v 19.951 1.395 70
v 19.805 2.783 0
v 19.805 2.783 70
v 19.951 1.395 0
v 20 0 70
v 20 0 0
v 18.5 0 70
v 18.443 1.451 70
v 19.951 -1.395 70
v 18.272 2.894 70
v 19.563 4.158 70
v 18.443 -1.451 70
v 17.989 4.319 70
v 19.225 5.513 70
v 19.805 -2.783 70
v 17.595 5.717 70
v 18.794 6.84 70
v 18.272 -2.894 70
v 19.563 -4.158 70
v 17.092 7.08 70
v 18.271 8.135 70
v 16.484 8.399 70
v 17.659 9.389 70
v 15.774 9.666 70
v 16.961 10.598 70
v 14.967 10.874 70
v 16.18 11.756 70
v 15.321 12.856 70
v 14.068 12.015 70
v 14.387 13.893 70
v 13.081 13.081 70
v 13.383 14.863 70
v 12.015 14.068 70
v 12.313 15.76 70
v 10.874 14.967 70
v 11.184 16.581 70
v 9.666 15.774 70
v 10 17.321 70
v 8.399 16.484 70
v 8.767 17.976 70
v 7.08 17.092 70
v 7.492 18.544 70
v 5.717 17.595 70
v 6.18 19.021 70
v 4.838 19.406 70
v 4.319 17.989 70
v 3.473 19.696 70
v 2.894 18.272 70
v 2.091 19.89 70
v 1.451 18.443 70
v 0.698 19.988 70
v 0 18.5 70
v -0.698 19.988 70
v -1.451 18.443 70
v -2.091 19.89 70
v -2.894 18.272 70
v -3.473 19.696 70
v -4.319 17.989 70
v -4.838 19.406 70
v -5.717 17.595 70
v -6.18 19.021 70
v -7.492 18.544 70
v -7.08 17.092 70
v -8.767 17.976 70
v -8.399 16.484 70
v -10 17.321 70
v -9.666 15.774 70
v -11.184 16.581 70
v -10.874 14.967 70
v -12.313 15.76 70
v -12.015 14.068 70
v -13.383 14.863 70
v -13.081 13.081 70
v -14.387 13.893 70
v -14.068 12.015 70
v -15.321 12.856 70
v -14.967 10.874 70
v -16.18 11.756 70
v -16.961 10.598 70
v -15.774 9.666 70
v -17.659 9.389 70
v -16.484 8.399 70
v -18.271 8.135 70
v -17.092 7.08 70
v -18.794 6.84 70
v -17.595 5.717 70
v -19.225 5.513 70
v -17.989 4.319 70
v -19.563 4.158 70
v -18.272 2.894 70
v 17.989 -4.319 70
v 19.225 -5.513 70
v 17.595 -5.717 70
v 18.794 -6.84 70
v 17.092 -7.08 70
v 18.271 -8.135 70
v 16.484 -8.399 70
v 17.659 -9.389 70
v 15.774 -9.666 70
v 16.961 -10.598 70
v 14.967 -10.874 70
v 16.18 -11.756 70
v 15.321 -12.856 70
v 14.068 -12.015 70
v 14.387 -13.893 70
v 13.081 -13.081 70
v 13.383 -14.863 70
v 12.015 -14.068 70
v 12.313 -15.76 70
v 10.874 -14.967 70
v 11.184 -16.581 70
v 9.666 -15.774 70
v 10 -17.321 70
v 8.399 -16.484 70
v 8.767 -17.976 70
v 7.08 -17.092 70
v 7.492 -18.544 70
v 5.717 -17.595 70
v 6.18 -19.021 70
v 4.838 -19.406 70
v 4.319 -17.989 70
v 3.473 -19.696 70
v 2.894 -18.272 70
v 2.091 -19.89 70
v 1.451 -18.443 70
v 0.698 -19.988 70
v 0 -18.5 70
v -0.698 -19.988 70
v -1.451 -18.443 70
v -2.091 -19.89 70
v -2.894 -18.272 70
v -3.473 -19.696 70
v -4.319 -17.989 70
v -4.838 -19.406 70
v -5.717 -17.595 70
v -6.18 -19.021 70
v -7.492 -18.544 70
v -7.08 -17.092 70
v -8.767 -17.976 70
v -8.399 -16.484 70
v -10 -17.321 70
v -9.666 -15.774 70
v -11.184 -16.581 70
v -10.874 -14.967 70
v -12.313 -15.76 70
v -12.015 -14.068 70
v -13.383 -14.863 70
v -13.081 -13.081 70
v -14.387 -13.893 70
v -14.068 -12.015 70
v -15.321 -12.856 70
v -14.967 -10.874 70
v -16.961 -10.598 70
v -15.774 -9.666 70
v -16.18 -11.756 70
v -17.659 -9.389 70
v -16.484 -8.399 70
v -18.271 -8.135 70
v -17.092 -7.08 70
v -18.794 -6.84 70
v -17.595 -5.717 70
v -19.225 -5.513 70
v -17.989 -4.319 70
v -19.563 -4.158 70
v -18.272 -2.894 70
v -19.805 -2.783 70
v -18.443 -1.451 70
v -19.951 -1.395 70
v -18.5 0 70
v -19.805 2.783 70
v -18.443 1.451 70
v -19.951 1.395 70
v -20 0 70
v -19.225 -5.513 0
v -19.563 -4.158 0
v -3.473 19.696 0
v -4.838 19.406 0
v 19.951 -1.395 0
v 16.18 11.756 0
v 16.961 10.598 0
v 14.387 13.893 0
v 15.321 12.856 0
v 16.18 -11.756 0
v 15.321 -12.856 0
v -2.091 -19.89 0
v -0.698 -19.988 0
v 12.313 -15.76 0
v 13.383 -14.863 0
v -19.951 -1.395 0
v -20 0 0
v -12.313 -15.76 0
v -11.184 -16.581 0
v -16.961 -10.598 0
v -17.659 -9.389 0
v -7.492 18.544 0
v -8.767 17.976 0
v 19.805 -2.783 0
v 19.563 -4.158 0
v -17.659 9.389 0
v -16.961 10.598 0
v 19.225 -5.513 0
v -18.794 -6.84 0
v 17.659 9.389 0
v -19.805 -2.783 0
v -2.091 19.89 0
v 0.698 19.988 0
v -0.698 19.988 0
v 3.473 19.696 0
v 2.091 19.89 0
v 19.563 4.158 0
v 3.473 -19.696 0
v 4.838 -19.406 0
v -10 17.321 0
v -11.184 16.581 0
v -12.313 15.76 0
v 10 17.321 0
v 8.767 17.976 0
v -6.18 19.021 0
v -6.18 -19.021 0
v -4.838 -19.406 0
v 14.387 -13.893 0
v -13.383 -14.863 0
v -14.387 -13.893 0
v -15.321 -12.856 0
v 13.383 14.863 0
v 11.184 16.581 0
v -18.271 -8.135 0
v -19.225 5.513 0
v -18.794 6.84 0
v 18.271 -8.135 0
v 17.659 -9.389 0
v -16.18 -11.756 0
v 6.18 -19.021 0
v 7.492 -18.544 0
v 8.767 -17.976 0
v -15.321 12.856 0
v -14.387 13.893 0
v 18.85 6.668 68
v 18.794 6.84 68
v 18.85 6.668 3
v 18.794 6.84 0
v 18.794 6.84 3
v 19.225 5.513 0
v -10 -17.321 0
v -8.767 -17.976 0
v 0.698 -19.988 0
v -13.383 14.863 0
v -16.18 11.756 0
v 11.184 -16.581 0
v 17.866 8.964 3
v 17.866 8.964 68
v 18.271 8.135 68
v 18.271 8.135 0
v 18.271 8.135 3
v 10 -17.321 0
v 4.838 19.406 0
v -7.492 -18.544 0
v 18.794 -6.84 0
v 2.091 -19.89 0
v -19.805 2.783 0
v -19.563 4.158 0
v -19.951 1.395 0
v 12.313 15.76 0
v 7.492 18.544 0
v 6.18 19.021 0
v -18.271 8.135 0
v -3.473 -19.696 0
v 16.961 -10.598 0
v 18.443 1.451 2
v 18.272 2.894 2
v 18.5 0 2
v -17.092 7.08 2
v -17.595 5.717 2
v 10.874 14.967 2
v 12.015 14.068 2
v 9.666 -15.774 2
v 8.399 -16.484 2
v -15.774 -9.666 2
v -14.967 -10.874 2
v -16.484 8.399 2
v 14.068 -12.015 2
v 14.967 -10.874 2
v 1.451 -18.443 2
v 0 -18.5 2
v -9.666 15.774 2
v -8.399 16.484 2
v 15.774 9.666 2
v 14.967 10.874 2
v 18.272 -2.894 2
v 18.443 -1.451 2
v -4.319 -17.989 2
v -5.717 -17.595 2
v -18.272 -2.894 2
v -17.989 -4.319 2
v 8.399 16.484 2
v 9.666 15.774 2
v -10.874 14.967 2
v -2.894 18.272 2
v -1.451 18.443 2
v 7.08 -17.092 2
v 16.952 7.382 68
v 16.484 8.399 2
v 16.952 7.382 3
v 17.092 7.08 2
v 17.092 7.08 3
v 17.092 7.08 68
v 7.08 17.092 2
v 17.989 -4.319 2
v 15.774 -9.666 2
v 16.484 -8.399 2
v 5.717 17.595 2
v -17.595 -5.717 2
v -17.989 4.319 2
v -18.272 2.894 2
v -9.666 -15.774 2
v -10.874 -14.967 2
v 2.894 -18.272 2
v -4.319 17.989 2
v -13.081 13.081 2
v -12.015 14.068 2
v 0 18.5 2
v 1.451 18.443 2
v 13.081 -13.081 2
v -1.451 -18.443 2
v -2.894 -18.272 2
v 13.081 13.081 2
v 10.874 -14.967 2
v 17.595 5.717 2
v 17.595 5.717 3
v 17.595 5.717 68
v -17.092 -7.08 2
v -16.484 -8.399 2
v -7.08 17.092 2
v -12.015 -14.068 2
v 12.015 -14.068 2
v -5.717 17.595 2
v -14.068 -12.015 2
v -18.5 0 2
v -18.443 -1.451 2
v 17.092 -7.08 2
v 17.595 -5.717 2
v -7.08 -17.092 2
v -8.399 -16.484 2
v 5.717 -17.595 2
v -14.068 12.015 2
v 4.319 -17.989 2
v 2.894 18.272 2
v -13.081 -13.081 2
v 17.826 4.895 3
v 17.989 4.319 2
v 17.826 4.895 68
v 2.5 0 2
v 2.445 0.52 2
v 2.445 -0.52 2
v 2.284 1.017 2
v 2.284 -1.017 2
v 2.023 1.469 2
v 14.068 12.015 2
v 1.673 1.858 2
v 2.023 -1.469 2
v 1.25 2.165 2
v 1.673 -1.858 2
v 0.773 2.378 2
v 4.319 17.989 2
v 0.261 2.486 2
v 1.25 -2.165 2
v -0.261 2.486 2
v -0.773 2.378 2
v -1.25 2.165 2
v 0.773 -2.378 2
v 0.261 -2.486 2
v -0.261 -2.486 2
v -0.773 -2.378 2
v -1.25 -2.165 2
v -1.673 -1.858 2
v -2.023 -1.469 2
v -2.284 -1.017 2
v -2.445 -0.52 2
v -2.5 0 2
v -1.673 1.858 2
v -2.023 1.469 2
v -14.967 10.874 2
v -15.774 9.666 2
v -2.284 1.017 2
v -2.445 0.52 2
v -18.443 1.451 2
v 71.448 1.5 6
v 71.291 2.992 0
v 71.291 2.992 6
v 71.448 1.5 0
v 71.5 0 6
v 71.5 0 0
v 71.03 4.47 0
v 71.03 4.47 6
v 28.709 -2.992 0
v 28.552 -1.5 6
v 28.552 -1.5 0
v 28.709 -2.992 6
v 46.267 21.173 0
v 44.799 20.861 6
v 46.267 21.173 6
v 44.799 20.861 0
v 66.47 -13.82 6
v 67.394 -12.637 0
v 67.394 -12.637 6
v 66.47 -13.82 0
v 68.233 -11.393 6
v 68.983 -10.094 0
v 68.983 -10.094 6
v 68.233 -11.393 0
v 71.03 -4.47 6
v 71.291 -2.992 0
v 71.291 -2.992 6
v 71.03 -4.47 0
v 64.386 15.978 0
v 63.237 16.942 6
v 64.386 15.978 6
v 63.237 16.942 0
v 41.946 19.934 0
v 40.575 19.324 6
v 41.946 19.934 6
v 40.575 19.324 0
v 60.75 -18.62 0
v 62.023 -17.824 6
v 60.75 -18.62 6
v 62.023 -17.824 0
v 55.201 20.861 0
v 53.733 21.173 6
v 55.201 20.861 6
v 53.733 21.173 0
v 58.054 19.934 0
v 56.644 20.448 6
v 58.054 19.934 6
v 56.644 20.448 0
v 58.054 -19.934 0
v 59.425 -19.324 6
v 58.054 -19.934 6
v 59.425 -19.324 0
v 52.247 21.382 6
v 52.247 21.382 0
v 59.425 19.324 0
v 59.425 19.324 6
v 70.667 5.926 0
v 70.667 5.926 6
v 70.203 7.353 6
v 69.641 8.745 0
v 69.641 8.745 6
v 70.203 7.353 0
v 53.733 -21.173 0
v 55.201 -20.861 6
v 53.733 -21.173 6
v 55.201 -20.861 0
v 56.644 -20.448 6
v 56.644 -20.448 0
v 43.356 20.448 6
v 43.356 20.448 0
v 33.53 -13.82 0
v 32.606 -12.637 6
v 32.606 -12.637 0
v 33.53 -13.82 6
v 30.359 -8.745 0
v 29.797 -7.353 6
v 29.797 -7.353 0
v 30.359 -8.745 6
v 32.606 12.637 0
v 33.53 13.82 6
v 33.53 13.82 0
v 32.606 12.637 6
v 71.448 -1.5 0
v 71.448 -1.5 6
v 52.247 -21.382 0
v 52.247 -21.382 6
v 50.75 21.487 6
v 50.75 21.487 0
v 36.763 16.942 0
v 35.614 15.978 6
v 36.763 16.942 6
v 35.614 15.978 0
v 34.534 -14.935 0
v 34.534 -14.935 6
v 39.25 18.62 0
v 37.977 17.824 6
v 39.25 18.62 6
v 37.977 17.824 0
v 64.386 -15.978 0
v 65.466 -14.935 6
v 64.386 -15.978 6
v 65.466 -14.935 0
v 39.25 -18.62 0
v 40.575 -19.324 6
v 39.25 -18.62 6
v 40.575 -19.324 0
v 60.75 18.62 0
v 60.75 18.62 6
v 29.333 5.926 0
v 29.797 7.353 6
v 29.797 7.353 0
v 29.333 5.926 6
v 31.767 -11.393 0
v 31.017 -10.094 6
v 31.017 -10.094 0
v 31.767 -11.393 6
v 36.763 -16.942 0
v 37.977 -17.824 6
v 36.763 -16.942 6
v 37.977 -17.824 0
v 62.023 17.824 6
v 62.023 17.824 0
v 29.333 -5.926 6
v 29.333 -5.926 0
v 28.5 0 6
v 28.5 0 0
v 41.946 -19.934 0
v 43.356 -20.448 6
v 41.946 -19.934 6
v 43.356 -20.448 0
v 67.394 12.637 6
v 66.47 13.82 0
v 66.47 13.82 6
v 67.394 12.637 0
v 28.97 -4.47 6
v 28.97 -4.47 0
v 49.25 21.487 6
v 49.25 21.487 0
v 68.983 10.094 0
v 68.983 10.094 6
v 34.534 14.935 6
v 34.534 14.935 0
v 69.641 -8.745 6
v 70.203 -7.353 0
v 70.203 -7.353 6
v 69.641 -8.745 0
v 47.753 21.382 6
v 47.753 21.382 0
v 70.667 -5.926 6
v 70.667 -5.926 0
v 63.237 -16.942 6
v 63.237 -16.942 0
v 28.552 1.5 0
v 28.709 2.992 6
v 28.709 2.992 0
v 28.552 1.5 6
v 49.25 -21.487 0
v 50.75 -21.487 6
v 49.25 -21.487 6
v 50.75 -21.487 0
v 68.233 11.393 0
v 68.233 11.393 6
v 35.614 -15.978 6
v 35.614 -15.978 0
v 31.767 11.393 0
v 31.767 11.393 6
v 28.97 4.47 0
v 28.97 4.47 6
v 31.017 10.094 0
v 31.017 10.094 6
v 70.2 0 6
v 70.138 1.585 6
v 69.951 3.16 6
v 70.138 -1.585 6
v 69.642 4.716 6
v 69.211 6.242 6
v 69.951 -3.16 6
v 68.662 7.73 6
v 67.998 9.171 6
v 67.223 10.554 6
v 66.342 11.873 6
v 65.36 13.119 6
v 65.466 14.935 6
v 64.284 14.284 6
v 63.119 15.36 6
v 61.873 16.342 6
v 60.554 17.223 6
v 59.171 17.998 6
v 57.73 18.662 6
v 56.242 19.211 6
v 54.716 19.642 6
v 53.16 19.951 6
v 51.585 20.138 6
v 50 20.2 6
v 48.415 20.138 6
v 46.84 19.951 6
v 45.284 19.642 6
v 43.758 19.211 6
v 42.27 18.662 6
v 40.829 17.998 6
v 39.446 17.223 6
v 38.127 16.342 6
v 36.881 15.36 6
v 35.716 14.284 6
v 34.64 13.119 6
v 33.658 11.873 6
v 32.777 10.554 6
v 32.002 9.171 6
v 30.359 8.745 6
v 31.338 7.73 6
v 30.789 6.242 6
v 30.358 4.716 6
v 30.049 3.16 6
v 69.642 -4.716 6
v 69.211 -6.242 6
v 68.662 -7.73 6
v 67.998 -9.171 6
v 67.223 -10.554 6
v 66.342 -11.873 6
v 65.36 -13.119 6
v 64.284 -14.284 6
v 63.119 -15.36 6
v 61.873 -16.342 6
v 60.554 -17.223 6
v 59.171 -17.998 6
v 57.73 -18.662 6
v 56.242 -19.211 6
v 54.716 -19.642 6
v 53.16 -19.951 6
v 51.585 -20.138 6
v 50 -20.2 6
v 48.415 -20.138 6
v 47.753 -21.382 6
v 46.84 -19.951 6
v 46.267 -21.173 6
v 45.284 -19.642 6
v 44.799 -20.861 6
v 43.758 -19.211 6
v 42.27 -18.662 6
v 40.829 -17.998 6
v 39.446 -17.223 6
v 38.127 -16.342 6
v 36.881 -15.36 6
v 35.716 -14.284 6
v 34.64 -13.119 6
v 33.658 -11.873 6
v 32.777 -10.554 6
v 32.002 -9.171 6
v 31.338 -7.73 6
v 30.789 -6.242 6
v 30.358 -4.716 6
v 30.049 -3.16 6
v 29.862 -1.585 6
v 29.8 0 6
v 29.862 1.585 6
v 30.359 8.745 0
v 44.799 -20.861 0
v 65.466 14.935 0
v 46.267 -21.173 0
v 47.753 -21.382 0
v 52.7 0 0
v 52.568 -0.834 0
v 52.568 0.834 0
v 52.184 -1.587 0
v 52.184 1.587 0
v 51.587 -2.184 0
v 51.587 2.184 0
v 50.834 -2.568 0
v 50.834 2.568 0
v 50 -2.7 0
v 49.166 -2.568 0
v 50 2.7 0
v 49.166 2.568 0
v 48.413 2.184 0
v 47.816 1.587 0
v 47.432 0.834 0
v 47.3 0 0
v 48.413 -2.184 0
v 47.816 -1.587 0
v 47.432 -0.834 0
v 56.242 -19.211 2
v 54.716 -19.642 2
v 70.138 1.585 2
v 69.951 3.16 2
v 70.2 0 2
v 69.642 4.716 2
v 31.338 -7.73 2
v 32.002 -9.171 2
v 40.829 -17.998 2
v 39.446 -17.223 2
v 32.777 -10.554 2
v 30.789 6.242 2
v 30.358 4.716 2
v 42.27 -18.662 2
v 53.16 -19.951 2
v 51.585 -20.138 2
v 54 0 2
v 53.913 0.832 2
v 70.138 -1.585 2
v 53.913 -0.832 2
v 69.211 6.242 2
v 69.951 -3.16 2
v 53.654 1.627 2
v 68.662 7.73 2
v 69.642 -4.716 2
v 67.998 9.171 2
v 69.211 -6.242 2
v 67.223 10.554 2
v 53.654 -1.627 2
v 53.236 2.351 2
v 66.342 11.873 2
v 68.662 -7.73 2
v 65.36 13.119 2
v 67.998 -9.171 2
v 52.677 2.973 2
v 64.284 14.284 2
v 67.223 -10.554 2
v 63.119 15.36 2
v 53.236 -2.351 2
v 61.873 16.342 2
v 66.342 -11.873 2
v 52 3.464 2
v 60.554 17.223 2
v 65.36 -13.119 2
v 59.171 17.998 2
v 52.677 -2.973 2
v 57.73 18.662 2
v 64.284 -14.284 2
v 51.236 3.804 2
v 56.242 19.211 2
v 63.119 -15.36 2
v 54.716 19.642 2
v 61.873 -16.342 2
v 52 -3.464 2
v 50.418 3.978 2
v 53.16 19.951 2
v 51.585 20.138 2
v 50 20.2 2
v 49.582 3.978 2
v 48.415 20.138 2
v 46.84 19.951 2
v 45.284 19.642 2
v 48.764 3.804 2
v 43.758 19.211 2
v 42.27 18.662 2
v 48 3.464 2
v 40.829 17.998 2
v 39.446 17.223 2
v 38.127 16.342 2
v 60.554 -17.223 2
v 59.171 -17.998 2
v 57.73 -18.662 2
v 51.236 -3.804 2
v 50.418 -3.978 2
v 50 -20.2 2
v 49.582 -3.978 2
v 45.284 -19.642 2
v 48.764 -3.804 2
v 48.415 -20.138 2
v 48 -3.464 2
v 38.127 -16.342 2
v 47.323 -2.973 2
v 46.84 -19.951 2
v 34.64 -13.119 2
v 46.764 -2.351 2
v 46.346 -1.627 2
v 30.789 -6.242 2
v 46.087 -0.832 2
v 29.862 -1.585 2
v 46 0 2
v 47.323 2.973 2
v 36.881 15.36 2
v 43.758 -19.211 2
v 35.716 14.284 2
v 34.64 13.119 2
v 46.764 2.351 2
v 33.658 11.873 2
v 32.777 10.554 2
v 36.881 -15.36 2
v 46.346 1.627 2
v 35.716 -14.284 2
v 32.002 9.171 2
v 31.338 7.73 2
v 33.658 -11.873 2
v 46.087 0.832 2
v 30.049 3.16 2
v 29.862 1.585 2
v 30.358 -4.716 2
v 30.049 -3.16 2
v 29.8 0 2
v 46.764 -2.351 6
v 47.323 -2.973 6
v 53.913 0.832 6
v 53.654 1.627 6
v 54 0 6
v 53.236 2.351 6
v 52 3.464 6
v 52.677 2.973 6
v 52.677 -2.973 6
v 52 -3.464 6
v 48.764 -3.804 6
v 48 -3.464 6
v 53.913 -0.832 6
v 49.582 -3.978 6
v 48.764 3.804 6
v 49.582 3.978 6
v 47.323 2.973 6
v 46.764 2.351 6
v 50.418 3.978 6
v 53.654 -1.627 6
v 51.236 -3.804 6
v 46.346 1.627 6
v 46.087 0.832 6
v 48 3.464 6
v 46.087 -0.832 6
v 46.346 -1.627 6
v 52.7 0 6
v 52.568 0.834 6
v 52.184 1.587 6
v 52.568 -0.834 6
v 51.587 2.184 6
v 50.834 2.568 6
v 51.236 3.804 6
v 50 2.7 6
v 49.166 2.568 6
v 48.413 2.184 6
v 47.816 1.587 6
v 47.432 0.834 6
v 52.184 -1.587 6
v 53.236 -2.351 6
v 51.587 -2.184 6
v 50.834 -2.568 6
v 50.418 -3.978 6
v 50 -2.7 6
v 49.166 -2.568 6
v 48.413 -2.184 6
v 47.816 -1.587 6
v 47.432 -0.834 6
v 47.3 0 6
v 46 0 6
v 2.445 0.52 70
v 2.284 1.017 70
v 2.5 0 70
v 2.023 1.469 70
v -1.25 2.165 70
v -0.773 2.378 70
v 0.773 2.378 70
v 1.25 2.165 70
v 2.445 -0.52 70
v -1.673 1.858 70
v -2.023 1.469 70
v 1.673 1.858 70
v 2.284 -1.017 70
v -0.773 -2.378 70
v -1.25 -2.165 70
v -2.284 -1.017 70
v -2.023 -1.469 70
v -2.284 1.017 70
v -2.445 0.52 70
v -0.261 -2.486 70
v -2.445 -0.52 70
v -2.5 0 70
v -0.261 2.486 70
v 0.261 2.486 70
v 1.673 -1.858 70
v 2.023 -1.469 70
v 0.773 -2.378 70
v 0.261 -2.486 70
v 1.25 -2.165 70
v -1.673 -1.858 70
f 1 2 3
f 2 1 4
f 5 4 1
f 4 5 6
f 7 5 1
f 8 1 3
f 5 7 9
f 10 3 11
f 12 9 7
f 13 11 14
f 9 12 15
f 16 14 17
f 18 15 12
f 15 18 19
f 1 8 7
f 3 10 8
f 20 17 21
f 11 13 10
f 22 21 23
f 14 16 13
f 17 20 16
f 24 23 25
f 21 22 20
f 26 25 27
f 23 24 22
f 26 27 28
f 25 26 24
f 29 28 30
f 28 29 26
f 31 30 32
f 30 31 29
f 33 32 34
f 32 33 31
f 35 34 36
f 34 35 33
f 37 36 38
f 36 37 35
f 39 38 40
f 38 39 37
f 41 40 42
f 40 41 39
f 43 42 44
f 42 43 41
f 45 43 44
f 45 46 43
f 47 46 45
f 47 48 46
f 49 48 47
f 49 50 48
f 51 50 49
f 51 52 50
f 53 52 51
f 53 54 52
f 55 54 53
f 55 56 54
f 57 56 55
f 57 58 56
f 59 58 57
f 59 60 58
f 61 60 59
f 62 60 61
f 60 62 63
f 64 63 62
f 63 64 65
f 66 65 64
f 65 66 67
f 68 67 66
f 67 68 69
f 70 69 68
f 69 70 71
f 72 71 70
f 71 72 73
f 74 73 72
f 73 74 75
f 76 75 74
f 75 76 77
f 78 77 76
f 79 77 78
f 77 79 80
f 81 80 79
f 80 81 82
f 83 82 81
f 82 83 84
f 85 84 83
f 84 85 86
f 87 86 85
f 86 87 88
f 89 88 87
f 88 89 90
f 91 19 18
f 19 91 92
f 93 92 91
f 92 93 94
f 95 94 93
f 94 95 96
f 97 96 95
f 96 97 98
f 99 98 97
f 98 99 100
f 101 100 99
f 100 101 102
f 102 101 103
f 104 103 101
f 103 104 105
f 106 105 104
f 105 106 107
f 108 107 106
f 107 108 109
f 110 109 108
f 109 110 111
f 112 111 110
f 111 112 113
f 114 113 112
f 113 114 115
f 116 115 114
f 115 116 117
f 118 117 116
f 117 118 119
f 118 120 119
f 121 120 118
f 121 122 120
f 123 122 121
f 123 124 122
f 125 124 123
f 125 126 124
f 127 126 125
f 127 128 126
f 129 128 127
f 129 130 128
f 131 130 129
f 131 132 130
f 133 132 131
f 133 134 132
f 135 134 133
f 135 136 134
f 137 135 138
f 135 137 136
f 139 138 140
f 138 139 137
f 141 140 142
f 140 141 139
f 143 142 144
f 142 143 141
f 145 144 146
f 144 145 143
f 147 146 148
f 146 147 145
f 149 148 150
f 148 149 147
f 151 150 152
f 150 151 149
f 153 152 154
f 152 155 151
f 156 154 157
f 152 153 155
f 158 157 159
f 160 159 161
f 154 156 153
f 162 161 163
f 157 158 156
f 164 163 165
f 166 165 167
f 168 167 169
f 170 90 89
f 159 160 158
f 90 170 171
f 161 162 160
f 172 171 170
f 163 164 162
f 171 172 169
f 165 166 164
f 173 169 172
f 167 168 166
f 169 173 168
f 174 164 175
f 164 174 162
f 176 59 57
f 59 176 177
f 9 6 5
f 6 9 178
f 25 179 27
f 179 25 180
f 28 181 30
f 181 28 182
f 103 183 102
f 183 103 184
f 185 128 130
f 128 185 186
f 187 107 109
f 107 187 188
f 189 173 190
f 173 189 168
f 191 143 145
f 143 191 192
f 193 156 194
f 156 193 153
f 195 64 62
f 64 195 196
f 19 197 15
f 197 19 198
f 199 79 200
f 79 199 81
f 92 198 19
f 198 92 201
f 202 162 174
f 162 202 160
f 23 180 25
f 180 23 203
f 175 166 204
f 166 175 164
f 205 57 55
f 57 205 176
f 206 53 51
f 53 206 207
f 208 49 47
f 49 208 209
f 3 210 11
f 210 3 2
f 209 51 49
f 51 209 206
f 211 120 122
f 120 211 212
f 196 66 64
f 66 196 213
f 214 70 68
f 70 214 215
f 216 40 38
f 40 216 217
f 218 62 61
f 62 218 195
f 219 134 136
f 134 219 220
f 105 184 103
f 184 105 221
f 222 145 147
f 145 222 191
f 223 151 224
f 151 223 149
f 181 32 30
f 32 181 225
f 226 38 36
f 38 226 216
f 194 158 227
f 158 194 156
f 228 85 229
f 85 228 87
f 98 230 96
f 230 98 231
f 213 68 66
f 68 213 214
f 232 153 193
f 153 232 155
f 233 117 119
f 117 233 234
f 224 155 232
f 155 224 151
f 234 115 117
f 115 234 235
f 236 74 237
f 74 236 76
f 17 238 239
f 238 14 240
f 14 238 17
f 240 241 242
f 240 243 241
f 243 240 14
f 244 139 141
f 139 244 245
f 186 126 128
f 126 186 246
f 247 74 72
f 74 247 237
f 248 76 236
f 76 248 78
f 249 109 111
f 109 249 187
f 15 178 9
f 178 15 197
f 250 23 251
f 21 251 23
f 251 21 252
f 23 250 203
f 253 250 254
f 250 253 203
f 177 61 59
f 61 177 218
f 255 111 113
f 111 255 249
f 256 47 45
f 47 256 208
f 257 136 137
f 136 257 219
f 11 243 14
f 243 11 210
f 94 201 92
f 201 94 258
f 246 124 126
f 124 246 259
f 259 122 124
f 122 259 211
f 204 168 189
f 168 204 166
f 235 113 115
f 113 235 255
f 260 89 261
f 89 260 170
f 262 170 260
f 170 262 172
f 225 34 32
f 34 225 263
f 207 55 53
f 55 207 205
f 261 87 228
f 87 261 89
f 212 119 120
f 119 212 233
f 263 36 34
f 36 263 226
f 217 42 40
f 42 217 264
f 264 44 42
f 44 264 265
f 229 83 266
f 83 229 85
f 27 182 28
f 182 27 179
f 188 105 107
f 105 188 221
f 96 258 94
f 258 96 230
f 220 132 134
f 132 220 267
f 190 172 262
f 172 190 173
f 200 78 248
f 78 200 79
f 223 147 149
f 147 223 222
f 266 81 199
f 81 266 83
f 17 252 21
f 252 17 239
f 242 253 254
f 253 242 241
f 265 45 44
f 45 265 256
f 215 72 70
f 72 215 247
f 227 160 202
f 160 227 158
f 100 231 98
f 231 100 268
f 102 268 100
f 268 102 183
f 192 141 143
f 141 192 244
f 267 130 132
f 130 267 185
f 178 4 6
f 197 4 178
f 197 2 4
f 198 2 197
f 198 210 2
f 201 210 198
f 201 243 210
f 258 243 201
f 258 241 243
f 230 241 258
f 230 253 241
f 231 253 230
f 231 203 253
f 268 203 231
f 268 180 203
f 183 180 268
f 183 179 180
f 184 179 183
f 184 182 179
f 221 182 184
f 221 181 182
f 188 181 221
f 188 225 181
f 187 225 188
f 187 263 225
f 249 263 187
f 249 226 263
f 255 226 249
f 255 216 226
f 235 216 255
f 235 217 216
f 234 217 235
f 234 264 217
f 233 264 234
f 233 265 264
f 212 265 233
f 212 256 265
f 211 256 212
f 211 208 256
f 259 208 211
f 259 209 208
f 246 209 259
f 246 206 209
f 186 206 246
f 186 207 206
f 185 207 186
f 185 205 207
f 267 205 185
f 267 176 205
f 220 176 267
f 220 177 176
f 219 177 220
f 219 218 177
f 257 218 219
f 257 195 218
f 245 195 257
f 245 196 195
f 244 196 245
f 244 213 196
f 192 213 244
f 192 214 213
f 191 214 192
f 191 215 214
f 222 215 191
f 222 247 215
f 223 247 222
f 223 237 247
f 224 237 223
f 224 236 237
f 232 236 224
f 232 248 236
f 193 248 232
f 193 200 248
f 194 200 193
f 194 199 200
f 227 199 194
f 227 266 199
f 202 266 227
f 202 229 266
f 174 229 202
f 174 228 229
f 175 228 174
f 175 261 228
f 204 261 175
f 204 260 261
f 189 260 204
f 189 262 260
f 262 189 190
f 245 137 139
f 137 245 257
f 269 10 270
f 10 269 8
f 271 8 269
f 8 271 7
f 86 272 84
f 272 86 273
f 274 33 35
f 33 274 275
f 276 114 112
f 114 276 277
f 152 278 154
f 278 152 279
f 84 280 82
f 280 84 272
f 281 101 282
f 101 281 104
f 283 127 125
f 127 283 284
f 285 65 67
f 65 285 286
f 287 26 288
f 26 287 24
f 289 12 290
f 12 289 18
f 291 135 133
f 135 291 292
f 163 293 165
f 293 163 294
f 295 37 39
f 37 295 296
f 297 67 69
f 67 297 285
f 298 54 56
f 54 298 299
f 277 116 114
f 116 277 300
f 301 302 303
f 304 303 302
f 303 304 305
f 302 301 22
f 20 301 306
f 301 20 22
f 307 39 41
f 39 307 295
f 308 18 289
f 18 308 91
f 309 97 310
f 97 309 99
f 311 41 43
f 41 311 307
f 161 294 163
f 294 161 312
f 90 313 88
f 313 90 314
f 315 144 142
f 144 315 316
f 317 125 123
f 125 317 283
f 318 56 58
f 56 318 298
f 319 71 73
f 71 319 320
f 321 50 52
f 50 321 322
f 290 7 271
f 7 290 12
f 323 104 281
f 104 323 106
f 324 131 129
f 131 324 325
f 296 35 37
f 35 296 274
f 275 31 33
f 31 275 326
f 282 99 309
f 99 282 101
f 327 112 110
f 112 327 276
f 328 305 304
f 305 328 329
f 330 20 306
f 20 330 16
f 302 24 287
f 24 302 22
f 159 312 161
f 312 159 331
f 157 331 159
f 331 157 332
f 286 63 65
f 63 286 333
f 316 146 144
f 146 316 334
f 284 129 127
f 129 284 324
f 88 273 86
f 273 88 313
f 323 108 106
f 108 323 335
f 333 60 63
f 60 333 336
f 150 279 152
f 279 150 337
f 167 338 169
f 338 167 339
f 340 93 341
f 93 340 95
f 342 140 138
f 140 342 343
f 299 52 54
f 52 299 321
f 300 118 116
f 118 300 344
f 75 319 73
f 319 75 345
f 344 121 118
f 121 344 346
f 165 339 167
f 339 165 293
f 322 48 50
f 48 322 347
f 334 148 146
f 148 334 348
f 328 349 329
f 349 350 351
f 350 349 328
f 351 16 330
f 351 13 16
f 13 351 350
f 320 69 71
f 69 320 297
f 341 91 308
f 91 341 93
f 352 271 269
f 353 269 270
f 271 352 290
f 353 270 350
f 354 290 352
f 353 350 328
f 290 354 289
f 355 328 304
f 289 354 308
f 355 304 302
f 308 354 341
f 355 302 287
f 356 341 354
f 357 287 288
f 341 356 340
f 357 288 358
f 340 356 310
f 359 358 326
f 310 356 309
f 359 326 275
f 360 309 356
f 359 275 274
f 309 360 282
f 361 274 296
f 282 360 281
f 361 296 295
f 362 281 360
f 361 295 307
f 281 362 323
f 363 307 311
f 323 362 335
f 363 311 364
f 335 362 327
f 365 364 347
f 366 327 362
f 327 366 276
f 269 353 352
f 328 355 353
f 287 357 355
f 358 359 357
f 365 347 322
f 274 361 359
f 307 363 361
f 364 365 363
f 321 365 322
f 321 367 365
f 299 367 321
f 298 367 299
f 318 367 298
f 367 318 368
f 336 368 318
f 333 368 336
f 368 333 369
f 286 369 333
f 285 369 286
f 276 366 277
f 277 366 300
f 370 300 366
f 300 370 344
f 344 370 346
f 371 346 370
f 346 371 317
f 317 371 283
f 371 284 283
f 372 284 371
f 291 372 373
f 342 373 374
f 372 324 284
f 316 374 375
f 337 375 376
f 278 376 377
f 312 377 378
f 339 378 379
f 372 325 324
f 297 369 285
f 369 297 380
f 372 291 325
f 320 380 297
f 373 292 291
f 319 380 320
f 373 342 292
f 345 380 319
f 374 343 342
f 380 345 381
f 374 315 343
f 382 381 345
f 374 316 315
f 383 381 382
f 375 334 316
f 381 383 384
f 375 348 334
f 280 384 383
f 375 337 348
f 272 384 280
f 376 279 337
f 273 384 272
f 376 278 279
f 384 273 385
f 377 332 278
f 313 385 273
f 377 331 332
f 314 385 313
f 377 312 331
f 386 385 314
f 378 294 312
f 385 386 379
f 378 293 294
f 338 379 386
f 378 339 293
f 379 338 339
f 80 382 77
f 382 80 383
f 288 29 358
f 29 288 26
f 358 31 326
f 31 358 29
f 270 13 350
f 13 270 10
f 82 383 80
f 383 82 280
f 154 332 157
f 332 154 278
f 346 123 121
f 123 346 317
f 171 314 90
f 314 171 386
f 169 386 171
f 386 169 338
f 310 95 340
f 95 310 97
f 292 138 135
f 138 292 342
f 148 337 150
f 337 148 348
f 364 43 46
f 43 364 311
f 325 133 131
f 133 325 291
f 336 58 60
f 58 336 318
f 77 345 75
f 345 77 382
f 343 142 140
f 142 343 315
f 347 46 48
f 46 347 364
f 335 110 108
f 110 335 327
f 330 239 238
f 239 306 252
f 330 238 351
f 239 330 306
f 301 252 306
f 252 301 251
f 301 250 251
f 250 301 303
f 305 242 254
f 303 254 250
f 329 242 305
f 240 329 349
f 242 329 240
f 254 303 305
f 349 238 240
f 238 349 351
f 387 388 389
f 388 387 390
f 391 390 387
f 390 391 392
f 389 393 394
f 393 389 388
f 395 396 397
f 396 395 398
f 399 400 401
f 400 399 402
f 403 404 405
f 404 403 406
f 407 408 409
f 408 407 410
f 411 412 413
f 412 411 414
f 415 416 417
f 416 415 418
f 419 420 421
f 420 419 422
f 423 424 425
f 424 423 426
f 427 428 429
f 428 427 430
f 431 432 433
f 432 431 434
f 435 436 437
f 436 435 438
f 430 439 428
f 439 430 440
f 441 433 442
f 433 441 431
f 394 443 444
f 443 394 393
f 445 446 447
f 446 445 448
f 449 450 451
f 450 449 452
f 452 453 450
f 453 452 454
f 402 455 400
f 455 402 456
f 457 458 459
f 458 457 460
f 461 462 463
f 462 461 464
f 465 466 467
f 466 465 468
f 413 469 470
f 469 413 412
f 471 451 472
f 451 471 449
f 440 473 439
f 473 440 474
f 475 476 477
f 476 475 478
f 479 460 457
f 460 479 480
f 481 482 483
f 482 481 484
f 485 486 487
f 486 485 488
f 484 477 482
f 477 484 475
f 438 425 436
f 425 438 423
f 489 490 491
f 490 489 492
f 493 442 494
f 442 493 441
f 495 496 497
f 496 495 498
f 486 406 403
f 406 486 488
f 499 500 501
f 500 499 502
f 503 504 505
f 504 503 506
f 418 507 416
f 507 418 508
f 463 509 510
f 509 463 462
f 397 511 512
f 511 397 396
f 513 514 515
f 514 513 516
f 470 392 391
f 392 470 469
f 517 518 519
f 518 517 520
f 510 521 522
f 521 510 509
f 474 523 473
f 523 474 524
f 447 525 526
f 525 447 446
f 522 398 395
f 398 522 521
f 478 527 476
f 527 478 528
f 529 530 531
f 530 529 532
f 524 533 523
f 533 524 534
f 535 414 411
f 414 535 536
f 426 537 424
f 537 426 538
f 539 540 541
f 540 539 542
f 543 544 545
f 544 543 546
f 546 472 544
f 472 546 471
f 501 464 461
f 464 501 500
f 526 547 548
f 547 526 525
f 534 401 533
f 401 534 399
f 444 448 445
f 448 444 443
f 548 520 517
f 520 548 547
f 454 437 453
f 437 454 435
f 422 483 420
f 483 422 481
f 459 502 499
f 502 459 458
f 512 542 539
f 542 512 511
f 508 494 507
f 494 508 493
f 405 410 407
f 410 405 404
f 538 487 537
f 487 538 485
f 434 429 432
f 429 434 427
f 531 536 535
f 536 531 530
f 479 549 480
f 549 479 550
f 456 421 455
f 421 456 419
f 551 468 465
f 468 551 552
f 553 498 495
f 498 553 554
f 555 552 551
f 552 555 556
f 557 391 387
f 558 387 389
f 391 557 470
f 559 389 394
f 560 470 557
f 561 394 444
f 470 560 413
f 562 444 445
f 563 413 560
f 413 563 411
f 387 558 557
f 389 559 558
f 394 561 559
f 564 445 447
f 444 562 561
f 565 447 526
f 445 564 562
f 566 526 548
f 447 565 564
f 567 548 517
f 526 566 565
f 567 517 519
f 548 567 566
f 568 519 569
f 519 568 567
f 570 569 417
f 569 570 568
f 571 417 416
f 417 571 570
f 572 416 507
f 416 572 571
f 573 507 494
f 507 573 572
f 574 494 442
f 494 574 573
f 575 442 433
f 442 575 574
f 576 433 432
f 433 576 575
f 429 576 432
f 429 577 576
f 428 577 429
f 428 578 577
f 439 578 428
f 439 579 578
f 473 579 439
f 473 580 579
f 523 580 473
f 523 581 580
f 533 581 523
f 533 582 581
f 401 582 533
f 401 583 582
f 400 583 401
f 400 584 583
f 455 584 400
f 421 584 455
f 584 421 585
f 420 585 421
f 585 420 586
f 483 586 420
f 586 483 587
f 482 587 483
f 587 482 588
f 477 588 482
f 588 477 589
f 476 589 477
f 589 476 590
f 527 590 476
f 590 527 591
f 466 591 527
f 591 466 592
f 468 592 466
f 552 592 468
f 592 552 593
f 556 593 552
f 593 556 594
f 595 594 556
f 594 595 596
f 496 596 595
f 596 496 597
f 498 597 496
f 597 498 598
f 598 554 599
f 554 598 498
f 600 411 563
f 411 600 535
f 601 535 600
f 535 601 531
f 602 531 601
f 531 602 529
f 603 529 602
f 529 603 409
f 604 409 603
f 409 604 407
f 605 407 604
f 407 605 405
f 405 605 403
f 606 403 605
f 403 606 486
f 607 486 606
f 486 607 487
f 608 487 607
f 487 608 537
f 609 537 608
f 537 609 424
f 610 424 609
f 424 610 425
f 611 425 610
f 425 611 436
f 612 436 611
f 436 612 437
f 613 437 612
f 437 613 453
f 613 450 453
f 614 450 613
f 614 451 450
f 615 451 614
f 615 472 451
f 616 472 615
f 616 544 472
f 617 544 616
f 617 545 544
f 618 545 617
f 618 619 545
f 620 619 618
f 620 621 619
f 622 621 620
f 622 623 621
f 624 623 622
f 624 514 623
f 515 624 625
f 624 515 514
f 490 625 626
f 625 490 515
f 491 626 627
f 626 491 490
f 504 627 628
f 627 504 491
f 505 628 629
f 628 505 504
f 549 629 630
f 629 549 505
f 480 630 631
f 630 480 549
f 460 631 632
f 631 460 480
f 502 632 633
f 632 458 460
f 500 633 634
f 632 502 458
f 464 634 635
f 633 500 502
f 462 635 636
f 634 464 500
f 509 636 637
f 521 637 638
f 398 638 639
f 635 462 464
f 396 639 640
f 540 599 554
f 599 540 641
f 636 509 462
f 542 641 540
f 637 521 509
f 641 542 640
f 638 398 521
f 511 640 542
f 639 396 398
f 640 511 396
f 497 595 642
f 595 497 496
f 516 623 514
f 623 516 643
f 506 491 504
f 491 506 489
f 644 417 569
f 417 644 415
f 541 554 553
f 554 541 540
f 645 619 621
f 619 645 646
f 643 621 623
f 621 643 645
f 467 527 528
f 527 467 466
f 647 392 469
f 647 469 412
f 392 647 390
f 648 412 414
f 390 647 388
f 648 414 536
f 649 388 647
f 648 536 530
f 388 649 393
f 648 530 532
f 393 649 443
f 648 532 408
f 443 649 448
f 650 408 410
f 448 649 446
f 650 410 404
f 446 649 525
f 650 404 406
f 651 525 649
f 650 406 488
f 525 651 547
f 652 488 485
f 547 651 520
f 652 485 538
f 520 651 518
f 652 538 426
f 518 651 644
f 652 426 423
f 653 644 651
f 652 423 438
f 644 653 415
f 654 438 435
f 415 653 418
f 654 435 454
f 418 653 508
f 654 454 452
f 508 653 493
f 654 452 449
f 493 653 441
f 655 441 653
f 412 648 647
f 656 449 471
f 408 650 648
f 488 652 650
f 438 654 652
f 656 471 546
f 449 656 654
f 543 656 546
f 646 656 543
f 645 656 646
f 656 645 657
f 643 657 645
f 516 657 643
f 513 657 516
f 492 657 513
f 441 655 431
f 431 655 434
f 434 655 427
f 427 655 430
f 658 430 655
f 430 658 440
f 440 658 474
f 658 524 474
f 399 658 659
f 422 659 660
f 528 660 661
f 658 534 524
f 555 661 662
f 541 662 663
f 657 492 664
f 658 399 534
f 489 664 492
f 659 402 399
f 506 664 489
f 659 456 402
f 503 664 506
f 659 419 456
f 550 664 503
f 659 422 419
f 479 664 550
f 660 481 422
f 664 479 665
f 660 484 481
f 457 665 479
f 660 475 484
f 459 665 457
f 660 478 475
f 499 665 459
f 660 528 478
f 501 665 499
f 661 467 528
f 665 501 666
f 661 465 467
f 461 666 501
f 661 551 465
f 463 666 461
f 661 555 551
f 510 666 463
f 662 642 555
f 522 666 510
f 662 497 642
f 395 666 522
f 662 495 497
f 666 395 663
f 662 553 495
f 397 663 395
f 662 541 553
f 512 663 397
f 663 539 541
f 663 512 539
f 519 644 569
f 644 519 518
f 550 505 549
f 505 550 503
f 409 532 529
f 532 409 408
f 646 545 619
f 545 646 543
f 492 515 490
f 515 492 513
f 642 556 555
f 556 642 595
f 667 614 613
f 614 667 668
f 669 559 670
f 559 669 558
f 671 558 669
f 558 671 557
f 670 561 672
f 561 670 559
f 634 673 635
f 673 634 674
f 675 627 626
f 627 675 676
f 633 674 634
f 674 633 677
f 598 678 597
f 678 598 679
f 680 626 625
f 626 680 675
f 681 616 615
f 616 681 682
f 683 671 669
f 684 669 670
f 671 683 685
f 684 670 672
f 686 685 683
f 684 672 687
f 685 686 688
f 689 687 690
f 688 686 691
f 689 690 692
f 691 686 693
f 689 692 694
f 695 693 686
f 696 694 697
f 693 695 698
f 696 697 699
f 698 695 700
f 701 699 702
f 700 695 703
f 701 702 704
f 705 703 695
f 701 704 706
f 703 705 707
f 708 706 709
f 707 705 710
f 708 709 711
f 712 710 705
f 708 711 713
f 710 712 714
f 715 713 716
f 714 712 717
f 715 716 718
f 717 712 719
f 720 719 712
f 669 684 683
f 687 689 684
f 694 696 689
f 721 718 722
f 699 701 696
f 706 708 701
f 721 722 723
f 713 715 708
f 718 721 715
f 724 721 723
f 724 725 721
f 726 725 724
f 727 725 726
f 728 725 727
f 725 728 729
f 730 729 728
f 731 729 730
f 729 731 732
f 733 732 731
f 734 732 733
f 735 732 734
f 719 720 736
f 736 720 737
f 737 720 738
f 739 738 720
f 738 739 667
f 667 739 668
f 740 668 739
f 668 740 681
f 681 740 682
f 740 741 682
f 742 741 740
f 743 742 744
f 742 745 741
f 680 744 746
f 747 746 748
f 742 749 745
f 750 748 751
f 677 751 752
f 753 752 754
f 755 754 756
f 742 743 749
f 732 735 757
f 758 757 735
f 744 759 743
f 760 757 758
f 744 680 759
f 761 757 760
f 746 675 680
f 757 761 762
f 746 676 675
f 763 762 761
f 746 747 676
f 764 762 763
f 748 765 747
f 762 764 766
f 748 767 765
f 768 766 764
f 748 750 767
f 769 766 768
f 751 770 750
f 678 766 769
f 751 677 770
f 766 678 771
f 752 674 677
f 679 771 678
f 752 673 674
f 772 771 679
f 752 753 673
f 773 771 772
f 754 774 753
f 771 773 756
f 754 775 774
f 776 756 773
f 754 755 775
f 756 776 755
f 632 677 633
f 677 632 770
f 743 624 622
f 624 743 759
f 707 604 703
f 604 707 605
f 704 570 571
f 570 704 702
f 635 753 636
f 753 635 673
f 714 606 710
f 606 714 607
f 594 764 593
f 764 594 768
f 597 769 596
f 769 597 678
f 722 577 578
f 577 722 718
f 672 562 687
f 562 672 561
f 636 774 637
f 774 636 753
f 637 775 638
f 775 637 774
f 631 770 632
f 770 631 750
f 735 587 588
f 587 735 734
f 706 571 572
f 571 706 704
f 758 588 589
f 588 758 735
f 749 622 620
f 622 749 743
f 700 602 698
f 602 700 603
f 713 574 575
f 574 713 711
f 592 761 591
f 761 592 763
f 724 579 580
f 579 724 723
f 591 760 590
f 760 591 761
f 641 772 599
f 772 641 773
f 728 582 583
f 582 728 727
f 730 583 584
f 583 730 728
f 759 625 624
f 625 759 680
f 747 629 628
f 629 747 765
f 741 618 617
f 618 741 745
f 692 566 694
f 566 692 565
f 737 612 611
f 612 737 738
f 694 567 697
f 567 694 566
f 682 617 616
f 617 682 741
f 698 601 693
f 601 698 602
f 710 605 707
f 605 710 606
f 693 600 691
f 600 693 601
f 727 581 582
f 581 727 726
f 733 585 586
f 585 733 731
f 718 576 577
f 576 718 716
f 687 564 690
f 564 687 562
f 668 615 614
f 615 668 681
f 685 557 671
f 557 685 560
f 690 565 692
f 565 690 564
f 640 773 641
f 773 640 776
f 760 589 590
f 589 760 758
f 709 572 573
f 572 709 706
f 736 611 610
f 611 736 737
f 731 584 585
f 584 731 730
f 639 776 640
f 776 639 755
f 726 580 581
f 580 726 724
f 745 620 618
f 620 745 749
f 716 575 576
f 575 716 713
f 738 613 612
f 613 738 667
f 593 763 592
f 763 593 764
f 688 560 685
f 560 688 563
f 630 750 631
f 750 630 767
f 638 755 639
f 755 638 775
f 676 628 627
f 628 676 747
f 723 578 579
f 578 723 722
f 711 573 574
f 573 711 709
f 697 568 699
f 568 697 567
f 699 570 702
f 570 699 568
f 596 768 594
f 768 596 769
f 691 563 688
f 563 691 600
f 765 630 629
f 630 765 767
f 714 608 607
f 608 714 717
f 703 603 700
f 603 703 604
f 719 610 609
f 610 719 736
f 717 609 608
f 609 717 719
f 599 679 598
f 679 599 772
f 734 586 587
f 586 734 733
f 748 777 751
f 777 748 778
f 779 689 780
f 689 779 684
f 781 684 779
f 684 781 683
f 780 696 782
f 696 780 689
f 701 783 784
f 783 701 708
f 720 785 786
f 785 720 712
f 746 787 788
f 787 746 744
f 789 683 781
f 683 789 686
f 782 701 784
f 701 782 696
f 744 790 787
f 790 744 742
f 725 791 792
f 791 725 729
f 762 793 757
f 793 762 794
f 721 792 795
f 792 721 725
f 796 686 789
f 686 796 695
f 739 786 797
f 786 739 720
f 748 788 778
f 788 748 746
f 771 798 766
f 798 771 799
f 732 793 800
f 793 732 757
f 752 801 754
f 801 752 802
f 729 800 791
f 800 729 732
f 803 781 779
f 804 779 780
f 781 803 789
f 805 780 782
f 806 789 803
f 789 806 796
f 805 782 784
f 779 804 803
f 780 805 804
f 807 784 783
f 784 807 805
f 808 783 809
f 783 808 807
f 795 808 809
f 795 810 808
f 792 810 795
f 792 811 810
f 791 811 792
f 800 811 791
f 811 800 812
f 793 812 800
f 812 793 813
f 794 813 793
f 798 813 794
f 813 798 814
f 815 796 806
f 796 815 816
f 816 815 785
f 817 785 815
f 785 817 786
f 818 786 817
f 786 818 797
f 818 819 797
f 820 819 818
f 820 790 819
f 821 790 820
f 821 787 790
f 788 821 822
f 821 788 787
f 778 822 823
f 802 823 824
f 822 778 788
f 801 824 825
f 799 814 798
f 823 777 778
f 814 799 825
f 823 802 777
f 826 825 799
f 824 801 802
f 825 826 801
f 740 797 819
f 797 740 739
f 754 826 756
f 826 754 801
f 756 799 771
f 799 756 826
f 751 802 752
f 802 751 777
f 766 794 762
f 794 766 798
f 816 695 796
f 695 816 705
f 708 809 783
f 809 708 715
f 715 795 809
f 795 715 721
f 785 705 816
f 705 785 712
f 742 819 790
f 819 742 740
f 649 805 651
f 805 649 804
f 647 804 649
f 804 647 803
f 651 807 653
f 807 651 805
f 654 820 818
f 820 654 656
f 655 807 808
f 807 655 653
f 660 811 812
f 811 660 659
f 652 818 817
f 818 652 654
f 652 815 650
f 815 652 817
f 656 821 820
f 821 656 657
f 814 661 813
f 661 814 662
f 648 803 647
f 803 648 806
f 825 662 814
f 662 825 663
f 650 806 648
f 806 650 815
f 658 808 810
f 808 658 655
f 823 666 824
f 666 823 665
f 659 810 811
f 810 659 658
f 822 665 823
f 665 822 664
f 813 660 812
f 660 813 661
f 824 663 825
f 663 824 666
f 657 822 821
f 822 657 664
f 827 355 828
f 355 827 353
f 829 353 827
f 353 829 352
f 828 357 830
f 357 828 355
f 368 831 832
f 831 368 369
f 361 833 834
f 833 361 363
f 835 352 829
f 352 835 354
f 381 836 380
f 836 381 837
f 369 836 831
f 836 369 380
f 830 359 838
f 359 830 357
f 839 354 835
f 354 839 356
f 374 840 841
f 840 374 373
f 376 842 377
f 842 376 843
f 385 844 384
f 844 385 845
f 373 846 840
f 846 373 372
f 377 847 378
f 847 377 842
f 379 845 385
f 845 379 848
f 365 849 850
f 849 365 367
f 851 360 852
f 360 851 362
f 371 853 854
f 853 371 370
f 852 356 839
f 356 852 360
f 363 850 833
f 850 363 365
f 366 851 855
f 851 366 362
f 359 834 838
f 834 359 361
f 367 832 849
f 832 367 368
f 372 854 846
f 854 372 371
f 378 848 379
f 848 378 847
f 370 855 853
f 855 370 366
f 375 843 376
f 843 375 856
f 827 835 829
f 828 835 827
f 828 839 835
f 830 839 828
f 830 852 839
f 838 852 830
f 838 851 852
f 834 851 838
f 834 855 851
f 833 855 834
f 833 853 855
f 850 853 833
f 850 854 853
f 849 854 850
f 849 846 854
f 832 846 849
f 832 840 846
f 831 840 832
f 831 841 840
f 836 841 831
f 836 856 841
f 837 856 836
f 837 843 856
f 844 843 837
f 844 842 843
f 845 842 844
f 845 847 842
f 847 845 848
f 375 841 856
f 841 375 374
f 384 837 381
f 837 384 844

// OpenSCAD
difference(){
  cylinder(d=40,h=70,$fn=90);
  translate([0,0,2]) cylinder(d=37,h=70.02,$fn=80);
  translate([15,0,3]) rotate([0,0,60]) cube([10,2,65]);
}
cylinder(d=5,h=70,$fn=30);
translate([50,0]) difference() { union(){
  difference() {
    cylinder(d=43,h=6,$fn=90);
    translate([0,0,2]) cylinder(d=40.4,h=4.01,$fn=80);
  }
  cylinder(d=8,h=6,$fn=30);
  //translate([0,0,-.01]) cylinder(d=7,h=3,$fn=6);
}
  translate([0,0,-.01]) cylinder(d=5.4,h=10,$fn=20);
}
